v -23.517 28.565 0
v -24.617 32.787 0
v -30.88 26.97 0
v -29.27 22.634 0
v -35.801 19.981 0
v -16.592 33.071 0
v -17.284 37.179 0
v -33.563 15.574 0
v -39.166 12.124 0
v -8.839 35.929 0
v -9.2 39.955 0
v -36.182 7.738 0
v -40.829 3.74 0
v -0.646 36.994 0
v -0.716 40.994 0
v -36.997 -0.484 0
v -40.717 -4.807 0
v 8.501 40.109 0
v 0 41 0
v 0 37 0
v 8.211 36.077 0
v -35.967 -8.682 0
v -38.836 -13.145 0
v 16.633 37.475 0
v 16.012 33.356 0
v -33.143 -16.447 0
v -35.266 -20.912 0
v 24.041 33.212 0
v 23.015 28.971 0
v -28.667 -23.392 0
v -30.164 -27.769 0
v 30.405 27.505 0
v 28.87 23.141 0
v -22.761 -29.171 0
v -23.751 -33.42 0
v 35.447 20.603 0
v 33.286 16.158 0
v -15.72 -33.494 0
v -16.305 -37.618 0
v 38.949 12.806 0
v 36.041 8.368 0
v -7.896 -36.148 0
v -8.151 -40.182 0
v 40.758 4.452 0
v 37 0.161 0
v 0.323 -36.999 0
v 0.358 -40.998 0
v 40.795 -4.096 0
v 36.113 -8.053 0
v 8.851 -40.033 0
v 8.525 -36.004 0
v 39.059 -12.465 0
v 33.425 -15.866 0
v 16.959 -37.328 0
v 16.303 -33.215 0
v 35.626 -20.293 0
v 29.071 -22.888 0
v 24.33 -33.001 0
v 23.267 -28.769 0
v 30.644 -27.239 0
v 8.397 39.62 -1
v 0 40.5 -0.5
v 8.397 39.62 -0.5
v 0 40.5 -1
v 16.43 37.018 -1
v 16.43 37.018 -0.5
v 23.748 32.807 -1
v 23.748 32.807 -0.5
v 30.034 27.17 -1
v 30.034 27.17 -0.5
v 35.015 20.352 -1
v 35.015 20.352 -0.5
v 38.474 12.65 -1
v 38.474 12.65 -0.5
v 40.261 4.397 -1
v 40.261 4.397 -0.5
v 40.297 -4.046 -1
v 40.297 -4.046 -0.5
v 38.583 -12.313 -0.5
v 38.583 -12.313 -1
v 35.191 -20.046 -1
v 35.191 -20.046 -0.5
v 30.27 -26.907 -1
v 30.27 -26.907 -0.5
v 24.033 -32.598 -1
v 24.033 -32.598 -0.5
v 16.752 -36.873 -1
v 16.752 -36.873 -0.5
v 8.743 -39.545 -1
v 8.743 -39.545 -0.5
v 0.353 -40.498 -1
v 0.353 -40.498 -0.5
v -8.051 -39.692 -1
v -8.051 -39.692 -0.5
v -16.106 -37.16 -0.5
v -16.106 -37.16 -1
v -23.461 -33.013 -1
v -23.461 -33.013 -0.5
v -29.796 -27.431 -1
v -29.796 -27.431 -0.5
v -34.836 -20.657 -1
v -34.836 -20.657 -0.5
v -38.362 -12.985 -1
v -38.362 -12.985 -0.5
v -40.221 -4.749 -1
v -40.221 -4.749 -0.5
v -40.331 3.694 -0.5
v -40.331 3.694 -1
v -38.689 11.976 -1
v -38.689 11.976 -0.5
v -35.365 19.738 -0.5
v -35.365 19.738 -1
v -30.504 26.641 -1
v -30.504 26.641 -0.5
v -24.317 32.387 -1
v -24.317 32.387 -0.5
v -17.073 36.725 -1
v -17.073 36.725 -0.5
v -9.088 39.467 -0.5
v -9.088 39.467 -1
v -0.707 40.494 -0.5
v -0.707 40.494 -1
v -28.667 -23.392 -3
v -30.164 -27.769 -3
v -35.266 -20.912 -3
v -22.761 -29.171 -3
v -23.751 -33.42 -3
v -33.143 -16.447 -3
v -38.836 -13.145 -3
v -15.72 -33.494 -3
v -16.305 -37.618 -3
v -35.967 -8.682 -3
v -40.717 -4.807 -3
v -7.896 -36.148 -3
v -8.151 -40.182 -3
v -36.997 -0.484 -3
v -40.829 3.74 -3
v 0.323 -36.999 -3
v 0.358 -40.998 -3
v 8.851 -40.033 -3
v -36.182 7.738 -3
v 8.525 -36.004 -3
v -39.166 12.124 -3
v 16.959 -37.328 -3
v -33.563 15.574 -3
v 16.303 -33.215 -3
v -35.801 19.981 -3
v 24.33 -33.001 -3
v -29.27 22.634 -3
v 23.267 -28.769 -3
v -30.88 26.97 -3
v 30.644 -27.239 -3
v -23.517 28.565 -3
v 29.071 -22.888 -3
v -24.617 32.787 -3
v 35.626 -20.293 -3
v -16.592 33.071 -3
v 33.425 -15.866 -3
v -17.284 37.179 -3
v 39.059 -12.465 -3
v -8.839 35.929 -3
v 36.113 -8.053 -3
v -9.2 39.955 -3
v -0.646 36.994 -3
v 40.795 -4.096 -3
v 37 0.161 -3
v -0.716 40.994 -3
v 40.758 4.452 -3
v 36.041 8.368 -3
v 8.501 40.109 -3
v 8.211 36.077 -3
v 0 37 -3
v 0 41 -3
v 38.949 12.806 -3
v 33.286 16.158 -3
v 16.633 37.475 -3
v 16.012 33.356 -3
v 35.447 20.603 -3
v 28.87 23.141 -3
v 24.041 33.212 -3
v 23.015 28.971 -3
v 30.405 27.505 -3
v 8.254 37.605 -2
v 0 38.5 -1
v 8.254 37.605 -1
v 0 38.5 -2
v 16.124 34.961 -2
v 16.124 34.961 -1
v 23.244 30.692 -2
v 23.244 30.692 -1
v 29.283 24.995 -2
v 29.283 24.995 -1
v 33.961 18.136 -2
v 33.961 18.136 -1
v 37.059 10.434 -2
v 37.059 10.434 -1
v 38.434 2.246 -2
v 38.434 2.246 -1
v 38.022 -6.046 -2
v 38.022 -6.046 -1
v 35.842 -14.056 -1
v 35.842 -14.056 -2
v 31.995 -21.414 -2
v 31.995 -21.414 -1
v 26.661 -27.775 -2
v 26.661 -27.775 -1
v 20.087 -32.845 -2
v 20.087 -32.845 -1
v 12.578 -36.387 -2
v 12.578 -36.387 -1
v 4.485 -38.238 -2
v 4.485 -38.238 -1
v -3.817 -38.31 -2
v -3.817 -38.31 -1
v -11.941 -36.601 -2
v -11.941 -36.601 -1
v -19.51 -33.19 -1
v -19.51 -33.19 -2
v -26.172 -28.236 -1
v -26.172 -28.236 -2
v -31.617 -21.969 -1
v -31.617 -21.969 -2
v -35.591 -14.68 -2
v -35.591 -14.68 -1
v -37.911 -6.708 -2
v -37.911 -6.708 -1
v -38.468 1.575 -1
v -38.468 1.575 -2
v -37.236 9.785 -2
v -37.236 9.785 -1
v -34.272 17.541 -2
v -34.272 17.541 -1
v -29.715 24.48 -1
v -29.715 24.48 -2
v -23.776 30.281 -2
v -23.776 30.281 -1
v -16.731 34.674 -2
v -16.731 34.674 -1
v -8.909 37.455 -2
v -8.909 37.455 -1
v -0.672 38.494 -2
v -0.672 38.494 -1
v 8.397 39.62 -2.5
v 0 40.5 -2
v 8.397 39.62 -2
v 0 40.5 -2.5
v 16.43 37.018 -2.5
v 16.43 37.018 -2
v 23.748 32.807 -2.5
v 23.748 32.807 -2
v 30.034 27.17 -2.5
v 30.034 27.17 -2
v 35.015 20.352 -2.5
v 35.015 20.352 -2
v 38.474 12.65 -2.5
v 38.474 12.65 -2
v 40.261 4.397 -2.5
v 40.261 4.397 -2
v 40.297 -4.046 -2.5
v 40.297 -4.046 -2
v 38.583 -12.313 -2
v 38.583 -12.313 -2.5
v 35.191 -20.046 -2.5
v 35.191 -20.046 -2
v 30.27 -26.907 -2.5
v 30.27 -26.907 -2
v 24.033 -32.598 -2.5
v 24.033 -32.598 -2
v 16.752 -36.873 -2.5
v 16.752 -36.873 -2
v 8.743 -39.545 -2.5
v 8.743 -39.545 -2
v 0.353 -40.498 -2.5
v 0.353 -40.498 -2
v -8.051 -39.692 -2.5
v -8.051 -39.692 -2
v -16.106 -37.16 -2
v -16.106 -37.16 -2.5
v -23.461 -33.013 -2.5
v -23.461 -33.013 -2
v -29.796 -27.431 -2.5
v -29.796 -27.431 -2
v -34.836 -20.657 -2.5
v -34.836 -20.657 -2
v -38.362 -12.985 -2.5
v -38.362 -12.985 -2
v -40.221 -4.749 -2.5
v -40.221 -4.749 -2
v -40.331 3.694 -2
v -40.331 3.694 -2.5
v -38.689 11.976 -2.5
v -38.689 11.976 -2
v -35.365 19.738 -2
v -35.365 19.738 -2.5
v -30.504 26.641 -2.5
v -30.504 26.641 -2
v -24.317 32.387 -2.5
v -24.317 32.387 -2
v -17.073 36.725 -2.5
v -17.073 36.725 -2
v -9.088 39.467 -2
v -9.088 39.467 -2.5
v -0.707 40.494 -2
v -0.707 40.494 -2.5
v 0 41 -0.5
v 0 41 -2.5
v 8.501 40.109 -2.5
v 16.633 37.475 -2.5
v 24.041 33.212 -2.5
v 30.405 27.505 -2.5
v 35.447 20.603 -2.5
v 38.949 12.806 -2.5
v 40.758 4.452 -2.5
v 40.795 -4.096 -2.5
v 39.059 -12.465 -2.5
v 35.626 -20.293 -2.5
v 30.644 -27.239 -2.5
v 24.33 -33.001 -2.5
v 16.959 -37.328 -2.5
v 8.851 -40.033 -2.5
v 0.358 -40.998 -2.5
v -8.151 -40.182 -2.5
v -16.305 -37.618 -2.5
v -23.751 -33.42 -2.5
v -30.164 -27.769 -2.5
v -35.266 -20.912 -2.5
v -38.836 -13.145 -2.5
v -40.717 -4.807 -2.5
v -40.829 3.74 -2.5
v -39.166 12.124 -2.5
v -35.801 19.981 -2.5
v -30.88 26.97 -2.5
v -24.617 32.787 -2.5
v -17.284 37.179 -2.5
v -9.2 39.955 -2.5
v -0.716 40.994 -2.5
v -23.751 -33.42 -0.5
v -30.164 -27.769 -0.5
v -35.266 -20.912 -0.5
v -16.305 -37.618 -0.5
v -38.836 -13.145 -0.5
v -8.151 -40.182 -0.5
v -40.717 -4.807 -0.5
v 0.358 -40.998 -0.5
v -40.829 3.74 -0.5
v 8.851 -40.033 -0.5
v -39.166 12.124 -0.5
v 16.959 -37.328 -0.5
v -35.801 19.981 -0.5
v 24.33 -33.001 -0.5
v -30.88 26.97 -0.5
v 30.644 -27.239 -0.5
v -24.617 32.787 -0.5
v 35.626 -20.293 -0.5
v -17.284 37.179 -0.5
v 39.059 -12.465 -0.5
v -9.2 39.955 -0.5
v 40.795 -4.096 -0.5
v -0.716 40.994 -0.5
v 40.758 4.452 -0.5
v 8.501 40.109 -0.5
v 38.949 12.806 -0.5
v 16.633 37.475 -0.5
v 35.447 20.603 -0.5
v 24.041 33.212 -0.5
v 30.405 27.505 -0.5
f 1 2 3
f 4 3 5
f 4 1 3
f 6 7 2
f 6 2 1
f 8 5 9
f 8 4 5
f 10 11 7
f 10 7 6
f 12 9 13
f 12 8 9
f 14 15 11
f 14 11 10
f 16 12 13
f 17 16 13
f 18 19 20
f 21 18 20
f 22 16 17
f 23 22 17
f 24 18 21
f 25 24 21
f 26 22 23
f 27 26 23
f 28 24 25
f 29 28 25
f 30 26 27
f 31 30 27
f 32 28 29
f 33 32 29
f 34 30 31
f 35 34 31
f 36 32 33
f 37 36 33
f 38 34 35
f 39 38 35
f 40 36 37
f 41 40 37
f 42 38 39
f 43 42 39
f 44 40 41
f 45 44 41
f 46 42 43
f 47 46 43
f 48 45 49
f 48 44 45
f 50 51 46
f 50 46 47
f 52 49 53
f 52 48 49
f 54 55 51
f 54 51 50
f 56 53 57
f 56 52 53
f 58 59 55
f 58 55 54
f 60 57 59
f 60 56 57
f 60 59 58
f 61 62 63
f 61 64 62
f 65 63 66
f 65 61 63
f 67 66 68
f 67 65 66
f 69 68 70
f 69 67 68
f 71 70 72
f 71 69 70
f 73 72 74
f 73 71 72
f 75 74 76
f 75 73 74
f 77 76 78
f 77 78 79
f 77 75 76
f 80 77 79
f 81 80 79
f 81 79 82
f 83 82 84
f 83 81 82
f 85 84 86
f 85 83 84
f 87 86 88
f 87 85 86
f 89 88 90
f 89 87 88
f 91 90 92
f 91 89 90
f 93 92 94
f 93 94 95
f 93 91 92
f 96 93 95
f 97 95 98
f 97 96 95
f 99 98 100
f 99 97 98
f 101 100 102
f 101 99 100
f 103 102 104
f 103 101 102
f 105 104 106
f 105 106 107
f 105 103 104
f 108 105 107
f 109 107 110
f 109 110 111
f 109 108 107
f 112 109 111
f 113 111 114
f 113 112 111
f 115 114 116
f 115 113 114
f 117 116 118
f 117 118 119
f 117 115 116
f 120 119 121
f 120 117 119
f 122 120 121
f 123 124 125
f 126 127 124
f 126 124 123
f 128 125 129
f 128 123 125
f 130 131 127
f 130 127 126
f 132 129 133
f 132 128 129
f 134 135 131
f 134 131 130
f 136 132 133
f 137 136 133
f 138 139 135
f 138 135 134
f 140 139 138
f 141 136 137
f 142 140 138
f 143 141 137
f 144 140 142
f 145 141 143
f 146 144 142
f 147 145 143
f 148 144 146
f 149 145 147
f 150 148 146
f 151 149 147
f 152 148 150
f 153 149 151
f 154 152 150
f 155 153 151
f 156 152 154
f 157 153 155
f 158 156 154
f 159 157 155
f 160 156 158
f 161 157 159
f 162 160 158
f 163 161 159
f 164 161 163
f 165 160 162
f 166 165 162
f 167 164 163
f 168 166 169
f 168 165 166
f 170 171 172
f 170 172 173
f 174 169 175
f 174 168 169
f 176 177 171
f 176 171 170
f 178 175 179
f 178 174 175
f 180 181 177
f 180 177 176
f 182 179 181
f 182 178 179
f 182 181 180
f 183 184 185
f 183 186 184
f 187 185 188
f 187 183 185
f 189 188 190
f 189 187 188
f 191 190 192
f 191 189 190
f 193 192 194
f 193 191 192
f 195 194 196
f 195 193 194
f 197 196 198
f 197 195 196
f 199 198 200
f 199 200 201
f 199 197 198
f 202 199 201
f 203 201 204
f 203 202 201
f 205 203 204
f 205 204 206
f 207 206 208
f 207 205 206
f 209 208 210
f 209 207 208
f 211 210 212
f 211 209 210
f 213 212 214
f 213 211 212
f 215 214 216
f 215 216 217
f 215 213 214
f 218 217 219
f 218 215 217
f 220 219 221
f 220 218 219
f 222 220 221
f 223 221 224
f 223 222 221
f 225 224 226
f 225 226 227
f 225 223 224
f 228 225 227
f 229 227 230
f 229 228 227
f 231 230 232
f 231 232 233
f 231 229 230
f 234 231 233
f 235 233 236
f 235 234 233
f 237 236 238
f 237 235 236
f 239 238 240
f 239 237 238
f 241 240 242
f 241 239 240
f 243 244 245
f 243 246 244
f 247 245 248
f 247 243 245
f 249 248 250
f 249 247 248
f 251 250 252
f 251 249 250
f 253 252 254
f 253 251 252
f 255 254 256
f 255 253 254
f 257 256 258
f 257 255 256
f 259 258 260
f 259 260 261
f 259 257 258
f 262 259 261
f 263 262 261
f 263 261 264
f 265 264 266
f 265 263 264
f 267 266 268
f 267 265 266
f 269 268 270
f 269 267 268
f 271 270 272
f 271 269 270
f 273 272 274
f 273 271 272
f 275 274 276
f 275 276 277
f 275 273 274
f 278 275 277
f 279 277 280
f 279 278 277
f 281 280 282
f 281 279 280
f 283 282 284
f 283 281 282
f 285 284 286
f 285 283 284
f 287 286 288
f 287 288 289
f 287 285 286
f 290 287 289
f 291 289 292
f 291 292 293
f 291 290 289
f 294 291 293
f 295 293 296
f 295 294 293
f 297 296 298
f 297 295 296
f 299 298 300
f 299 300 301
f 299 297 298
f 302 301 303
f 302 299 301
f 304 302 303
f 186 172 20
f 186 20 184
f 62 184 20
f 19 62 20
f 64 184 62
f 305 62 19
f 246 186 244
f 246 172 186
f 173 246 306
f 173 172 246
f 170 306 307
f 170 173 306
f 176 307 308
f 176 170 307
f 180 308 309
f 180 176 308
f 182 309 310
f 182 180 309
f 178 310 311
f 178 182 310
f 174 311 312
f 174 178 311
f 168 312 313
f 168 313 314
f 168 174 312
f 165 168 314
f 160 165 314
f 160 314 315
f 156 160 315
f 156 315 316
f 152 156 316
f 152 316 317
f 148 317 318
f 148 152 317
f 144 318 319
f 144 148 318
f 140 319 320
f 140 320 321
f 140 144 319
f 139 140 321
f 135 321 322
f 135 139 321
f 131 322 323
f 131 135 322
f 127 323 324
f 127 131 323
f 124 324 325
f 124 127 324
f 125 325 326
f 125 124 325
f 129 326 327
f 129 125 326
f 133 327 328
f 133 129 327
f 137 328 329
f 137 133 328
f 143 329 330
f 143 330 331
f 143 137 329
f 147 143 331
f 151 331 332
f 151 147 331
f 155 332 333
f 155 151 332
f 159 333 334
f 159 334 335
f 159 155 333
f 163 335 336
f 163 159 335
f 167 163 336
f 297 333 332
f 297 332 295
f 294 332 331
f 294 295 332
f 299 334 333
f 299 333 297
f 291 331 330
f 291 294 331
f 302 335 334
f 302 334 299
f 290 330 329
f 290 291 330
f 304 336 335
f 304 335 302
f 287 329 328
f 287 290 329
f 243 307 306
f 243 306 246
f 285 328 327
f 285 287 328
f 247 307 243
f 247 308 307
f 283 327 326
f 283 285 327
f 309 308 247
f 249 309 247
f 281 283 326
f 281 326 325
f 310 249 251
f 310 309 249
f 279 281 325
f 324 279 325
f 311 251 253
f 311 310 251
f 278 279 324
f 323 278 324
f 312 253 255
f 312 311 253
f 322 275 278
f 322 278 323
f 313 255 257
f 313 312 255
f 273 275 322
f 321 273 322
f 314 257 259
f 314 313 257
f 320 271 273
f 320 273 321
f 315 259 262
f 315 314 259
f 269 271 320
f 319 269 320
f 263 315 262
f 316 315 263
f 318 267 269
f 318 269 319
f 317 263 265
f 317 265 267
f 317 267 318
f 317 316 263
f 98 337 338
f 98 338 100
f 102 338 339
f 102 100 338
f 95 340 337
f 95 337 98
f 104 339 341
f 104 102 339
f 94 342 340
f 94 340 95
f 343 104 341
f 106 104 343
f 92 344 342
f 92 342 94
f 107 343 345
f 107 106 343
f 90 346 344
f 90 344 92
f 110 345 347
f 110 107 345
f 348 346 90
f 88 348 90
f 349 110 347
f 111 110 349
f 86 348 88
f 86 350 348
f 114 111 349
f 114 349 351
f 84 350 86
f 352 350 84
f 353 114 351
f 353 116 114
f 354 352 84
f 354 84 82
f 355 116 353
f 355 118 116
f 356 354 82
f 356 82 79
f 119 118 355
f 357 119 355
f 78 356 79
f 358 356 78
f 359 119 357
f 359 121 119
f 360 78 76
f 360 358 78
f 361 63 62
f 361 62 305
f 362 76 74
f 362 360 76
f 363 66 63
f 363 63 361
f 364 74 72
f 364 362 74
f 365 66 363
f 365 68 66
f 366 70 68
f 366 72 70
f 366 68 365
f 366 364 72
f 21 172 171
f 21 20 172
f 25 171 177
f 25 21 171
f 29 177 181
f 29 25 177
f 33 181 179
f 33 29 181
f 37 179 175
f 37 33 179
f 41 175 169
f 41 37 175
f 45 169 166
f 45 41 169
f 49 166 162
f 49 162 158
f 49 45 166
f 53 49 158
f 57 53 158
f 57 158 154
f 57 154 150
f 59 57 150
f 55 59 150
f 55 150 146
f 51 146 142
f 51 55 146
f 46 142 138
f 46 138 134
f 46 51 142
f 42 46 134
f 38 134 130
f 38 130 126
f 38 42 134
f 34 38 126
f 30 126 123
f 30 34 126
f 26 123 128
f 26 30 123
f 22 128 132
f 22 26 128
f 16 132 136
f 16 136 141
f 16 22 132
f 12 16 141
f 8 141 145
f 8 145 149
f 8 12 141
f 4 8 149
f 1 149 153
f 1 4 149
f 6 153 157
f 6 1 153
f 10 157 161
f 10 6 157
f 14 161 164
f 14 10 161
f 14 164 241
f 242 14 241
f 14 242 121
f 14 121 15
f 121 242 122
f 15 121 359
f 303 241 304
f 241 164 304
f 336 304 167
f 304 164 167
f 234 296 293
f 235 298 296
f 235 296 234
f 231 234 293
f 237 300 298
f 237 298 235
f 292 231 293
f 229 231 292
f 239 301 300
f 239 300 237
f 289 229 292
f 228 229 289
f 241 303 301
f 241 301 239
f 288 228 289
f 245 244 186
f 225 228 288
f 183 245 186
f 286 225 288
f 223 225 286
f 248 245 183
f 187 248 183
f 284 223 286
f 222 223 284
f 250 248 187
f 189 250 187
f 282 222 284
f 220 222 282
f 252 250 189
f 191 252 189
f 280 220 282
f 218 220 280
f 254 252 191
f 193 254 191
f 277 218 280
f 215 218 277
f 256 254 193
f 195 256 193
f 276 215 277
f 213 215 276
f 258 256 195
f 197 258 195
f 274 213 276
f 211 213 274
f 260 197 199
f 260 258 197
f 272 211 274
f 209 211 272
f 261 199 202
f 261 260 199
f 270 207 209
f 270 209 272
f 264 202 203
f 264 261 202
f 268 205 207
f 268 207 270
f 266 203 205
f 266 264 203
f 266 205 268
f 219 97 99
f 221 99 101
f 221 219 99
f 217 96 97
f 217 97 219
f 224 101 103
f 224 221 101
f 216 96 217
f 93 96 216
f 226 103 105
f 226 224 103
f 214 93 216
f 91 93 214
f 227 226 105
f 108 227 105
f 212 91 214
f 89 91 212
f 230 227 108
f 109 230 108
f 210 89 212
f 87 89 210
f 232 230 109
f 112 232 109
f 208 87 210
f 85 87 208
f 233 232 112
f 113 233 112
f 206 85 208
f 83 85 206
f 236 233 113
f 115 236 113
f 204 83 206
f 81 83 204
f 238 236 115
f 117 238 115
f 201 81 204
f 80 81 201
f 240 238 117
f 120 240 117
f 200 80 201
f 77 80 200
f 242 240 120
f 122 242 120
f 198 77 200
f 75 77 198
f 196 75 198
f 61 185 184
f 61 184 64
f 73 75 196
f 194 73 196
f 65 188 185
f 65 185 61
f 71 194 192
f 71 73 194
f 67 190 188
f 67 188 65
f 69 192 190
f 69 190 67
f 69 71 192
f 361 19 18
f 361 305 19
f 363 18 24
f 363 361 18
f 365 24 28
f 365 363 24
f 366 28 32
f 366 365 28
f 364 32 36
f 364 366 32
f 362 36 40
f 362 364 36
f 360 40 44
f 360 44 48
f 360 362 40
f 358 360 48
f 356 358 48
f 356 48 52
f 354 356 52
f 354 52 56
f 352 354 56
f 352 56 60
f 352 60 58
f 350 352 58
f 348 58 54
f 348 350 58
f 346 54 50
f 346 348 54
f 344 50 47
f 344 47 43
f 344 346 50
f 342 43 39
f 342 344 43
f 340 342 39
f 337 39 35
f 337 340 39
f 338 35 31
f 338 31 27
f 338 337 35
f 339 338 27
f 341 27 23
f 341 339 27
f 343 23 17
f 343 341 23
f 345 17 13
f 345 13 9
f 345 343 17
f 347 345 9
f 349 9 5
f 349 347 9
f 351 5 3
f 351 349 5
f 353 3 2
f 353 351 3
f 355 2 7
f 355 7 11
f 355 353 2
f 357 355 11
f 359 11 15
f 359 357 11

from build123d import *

# Parameters (mm, degrees)
REVOLVE_1_ANGLE = 359


with BuildPart() as part:
    # 草图2 → 旋转1 (revolve)
    with BuildSketch(Plane(origin=(0, 0, 0), x_dir=(0, 1, 0), z_dir=(-1, 0, 0))):
        Polygon((37, 0), (41, 0), (41, 0.5), (40.5, 0.5), (40.5, 1), (38.5, 1), (38.5, 2), (40.5, 2), (40.5, 2.5), (41, 2.5), (41, 3), (37, 3), align=None)
    revolve(axis=Axis((0, 0, 0), (0, 0, -1)), revolution_arc=REVOLVE_1_ANGLE)


solid = part.part
